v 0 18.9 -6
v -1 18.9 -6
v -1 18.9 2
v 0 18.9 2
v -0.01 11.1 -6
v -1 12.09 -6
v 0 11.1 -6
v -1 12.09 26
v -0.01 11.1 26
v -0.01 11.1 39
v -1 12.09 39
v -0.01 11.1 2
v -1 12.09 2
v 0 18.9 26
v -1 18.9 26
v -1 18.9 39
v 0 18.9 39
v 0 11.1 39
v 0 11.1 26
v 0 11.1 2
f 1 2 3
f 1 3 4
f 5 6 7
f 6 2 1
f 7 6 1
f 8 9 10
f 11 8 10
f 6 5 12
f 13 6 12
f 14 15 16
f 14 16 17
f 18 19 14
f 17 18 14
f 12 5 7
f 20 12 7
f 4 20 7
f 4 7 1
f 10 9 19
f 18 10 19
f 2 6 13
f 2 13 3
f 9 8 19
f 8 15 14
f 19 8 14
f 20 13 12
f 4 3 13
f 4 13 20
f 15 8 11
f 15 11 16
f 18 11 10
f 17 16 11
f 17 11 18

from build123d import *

# Parameters (mm, degrees)
BOX022_W              = 1
BOX022_H              = 7.8
BOX022_DEPTH          = 13
BOX013_W              = 1
BOX013_H              = 7.8
BOX013_DEPTH          = 8
CHAMFER020026007_SIZE = 0.99


with BuildPart() as cube022:
    # Box022 → Box022 (new body)
    with BuildSketch(Plane(origin=(-1, 11.1, 26), x_dir=(1, 0, 0), z_dir=(0, 0, 1))):
        with Locations((0.5, 3.9)):
            Rectangle(BOX022_W, BOX022_H)
    extrude(amount=BOX022_DEPTH)


with BuildPart() as chamfer020026007:
    # Box013 → Box013 (new body)
    with BuildSketch(Plane(origin=(-1, 11.1, -6), x_dir=(1, 0, 0), z_dir=(0, 0, 1))):
        with Locations((0.5, 3.9)):
            Rectangle(BOX013_W, BOX013_H)
    extrude(amount=BOX013_DEPTH)

    # Fusion: union Cube022
    add(cube022.part)

    # Chamfer020026007
    chamfer020026007_edges = [chamfer020026007.edges().sort_by_distance(p)[0] for p in [
        (-1, 11.1, -2),
        (-1, 11.1, 32.5),
    ]]
    chamfer(chamfer020026007_edges, length=CHAMFER020026007_SIZE)


solid = chamfer020026007.part
